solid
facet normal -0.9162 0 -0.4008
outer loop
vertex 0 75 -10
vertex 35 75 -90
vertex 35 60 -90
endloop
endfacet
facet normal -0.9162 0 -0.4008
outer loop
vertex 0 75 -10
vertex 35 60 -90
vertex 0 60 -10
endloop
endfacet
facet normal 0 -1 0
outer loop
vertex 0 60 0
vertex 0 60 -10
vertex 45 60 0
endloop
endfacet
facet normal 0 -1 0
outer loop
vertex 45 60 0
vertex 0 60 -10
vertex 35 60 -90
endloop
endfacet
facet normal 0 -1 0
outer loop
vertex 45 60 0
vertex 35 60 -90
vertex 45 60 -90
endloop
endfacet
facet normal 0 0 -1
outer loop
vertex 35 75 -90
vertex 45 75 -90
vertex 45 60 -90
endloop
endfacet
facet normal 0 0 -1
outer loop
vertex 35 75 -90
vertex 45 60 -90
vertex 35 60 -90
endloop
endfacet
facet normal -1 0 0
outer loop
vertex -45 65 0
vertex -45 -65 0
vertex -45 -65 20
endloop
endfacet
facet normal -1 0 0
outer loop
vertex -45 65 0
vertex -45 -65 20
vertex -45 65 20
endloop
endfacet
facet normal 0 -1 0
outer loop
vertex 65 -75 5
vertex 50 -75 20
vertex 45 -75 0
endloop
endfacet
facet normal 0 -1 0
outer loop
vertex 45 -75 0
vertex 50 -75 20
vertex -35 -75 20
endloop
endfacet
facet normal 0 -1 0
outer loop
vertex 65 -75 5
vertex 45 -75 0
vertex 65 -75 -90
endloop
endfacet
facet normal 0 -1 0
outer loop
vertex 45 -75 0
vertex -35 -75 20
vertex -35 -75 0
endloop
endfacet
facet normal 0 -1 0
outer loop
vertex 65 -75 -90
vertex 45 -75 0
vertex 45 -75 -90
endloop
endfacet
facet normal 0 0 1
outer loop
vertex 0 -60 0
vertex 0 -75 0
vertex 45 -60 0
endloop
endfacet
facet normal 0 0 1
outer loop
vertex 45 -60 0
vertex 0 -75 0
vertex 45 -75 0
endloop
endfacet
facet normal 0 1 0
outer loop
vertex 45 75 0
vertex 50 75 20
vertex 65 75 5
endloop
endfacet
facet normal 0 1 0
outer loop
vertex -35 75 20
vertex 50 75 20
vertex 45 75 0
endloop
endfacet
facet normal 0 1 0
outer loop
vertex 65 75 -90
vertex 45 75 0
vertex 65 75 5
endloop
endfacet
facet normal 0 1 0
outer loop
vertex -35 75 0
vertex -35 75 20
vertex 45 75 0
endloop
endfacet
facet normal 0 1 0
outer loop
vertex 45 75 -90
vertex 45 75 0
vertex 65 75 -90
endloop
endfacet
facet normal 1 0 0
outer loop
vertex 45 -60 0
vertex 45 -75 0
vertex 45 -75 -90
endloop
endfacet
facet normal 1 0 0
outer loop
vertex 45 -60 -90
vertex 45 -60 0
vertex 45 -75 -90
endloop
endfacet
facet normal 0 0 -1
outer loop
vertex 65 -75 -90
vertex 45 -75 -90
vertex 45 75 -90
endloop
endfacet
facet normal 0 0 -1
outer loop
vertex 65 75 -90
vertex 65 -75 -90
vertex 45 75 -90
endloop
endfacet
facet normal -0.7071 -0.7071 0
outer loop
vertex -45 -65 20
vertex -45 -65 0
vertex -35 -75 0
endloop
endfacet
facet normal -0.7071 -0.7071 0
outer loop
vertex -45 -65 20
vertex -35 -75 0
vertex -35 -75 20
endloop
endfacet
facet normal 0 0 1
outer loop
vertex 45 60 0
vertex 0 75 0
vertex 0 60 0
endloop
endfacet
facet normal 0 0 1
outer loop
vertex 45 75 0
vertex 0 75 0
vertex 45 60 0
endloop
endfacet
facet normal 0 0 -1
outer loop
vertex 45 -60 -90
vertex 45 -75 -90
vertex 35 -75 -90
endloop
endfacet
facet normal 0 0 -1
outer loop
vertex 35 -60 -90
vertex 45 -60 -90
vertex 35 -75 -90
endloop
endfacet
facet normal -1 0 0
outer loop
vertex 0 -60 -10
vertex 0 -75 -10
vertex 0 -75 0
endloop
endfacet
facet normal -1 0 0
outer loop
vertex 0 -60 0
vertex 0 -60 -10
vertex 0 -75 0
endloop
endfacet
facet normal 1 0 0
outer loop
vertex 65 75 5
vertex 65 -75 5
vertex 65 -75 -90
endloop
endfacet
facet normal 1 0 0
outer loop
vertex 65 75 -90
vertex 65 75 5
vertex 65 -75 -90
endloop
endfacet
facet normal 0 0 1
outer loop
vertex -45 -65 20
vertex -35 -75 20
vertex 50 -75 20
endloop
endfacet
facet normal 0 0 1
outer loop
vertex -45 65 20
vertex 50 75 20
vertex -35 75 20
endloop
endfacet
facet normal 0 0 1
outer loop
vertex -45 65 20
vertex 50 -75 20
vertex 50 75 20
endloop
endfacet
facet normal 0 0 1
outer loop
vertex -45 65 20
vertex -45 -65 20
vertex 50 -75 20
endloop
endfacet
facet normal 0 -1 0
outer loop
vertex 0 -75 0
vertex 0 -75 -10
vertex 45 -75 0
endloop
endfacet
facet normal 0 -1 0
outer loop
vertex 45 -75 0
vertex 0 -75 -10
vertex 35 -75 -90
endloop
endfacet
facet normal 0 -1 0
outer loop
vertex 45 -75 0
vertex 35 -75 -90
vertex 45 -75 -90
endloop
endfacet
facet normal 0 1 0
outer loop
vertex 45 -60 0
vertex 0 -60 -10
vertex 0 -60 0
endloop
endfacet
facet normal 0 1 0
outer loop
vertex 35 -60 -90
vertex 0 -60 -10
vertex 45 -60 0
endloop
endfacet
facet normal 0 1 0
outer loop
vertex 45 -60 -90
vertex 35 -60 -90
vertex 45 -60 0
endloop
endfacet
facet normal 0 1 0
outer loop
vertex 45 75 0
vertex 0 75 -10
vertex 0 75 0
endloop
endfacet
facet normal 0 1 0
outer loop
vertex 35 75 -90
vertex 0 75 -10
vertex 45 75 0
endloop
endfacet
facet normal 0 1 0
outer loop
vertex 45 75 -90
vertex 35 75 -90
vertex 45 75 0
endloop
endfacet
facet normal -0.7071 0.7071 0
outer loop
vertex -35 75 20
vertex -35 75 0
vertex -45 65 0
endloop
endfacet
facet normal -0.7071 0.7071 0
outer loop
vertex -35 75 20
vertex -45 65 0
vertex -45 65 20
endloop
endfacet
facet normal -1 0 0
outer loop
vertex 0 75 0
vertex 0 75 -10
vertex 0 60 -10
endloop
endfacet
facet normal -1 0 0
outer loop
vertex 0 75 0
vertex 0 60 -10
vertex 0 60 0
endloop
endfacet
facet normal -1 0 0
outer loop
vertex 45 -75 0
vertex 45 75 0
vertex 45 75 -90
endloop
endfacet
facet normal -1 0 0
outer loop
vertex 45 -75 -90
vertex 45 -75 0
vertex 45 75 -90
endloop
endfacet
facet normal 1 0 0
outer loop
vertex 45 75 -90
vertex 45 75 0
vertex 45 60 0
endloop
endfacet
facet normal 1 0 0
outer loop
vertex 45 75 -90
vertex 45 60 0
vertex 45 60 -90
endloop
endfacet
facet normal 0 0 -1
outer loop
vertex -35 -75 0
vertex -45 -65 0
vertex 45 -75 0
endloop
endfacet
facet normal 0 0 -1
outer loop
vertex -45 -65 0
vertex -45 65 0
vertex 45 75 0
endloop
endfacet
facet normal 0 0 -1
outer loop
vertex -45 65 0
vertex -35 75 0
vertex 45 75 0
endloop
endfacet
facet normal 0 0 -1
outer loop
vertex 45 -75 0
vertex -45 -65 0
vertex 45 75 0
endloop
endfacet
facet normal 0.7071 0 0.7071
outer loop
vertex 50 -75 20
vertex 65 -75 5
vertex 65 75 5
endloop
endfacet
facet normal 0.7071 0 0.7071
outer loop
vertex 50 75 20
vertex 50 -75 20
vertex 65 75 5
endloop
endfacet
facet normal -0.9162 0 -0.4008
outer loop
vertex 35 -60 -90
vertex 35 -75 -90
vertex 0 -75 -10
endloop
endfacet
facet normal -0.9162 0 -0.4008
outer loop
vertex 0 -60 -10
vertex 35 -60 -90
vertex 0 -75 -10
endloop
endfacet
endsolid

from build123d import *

# Parameters (mm, degrees)
SKETCH_1_W      = 90
SKETCH_1_H      = 150
EXTRUDE_1_DEPTH = 20
SKETCH_2_W      = 110
SKETCH_2_H      = 150
EXTRUDE_2_DEPTH = 20
CHAMFER_1_SIZE  = 10
EXTRUDE_3_DEPTH = 15
CHAMFER_2_SIZE  = 15


with BuildPart() as part:
    # 草图1 → 凸台-拉伸1 (new body)
    with BuildSketch(Plane.XY):
        Rectangle(SKETCH_1_W, SKETCH_1_H)
    extrude(amount=EXTRUDE_1_DEPTH)

    # 草图2 → 凸台-拉伸2 (add)
    with BuildSketch(Plane(origin=(45, 0, 0), x_dir=(0, 0, -1), z_dir=(1, 0, 0))):
        with Locations((35, 0)):
            Rectangle(SKETCH_2_W, SKETCH_2_H)
    extrude(amount=EXTRUDE_2_DEPTH)

    # 倒角1
    chamfer_1_edges = [part.edges().sort_by_distance(p)[0] for p in [
        (-45, -75, 10),
        (-45, 75, 10),
    ]]
    chamfer(chamfer_1_edges, length=CHAMFER_1_SIZE)

    # 倒角2
    chamfer_2_edges = [part.edges().sort_by_distance(p)[0] for p in [
        (65, 0, 20),
    ]]
    chamfer(chamfer_2_edges, length=CHAMFER_2_SIZE)


with BuildPart() as body_2:
    # 草图3 → 凸台-拉伸3 (new body)
    with BuildSketch(Plane(origin=(0, 75, 0), x_dir=(1, 0, 0), z_dir=(0, 1, 0))):
        Polygon((45, 90), (35, 90), (0, 10), (0, 0), (45, 0), align=None)
    extrude(amount=-EXTRUDE_3_DEPTH)


with BuildPart() as body_3:
    # 镜向1: mirrored copy
    add(body_2.part.mirror(Plane.ZX))


solid = Compound([part.part, body_2.part, body_3.part])
